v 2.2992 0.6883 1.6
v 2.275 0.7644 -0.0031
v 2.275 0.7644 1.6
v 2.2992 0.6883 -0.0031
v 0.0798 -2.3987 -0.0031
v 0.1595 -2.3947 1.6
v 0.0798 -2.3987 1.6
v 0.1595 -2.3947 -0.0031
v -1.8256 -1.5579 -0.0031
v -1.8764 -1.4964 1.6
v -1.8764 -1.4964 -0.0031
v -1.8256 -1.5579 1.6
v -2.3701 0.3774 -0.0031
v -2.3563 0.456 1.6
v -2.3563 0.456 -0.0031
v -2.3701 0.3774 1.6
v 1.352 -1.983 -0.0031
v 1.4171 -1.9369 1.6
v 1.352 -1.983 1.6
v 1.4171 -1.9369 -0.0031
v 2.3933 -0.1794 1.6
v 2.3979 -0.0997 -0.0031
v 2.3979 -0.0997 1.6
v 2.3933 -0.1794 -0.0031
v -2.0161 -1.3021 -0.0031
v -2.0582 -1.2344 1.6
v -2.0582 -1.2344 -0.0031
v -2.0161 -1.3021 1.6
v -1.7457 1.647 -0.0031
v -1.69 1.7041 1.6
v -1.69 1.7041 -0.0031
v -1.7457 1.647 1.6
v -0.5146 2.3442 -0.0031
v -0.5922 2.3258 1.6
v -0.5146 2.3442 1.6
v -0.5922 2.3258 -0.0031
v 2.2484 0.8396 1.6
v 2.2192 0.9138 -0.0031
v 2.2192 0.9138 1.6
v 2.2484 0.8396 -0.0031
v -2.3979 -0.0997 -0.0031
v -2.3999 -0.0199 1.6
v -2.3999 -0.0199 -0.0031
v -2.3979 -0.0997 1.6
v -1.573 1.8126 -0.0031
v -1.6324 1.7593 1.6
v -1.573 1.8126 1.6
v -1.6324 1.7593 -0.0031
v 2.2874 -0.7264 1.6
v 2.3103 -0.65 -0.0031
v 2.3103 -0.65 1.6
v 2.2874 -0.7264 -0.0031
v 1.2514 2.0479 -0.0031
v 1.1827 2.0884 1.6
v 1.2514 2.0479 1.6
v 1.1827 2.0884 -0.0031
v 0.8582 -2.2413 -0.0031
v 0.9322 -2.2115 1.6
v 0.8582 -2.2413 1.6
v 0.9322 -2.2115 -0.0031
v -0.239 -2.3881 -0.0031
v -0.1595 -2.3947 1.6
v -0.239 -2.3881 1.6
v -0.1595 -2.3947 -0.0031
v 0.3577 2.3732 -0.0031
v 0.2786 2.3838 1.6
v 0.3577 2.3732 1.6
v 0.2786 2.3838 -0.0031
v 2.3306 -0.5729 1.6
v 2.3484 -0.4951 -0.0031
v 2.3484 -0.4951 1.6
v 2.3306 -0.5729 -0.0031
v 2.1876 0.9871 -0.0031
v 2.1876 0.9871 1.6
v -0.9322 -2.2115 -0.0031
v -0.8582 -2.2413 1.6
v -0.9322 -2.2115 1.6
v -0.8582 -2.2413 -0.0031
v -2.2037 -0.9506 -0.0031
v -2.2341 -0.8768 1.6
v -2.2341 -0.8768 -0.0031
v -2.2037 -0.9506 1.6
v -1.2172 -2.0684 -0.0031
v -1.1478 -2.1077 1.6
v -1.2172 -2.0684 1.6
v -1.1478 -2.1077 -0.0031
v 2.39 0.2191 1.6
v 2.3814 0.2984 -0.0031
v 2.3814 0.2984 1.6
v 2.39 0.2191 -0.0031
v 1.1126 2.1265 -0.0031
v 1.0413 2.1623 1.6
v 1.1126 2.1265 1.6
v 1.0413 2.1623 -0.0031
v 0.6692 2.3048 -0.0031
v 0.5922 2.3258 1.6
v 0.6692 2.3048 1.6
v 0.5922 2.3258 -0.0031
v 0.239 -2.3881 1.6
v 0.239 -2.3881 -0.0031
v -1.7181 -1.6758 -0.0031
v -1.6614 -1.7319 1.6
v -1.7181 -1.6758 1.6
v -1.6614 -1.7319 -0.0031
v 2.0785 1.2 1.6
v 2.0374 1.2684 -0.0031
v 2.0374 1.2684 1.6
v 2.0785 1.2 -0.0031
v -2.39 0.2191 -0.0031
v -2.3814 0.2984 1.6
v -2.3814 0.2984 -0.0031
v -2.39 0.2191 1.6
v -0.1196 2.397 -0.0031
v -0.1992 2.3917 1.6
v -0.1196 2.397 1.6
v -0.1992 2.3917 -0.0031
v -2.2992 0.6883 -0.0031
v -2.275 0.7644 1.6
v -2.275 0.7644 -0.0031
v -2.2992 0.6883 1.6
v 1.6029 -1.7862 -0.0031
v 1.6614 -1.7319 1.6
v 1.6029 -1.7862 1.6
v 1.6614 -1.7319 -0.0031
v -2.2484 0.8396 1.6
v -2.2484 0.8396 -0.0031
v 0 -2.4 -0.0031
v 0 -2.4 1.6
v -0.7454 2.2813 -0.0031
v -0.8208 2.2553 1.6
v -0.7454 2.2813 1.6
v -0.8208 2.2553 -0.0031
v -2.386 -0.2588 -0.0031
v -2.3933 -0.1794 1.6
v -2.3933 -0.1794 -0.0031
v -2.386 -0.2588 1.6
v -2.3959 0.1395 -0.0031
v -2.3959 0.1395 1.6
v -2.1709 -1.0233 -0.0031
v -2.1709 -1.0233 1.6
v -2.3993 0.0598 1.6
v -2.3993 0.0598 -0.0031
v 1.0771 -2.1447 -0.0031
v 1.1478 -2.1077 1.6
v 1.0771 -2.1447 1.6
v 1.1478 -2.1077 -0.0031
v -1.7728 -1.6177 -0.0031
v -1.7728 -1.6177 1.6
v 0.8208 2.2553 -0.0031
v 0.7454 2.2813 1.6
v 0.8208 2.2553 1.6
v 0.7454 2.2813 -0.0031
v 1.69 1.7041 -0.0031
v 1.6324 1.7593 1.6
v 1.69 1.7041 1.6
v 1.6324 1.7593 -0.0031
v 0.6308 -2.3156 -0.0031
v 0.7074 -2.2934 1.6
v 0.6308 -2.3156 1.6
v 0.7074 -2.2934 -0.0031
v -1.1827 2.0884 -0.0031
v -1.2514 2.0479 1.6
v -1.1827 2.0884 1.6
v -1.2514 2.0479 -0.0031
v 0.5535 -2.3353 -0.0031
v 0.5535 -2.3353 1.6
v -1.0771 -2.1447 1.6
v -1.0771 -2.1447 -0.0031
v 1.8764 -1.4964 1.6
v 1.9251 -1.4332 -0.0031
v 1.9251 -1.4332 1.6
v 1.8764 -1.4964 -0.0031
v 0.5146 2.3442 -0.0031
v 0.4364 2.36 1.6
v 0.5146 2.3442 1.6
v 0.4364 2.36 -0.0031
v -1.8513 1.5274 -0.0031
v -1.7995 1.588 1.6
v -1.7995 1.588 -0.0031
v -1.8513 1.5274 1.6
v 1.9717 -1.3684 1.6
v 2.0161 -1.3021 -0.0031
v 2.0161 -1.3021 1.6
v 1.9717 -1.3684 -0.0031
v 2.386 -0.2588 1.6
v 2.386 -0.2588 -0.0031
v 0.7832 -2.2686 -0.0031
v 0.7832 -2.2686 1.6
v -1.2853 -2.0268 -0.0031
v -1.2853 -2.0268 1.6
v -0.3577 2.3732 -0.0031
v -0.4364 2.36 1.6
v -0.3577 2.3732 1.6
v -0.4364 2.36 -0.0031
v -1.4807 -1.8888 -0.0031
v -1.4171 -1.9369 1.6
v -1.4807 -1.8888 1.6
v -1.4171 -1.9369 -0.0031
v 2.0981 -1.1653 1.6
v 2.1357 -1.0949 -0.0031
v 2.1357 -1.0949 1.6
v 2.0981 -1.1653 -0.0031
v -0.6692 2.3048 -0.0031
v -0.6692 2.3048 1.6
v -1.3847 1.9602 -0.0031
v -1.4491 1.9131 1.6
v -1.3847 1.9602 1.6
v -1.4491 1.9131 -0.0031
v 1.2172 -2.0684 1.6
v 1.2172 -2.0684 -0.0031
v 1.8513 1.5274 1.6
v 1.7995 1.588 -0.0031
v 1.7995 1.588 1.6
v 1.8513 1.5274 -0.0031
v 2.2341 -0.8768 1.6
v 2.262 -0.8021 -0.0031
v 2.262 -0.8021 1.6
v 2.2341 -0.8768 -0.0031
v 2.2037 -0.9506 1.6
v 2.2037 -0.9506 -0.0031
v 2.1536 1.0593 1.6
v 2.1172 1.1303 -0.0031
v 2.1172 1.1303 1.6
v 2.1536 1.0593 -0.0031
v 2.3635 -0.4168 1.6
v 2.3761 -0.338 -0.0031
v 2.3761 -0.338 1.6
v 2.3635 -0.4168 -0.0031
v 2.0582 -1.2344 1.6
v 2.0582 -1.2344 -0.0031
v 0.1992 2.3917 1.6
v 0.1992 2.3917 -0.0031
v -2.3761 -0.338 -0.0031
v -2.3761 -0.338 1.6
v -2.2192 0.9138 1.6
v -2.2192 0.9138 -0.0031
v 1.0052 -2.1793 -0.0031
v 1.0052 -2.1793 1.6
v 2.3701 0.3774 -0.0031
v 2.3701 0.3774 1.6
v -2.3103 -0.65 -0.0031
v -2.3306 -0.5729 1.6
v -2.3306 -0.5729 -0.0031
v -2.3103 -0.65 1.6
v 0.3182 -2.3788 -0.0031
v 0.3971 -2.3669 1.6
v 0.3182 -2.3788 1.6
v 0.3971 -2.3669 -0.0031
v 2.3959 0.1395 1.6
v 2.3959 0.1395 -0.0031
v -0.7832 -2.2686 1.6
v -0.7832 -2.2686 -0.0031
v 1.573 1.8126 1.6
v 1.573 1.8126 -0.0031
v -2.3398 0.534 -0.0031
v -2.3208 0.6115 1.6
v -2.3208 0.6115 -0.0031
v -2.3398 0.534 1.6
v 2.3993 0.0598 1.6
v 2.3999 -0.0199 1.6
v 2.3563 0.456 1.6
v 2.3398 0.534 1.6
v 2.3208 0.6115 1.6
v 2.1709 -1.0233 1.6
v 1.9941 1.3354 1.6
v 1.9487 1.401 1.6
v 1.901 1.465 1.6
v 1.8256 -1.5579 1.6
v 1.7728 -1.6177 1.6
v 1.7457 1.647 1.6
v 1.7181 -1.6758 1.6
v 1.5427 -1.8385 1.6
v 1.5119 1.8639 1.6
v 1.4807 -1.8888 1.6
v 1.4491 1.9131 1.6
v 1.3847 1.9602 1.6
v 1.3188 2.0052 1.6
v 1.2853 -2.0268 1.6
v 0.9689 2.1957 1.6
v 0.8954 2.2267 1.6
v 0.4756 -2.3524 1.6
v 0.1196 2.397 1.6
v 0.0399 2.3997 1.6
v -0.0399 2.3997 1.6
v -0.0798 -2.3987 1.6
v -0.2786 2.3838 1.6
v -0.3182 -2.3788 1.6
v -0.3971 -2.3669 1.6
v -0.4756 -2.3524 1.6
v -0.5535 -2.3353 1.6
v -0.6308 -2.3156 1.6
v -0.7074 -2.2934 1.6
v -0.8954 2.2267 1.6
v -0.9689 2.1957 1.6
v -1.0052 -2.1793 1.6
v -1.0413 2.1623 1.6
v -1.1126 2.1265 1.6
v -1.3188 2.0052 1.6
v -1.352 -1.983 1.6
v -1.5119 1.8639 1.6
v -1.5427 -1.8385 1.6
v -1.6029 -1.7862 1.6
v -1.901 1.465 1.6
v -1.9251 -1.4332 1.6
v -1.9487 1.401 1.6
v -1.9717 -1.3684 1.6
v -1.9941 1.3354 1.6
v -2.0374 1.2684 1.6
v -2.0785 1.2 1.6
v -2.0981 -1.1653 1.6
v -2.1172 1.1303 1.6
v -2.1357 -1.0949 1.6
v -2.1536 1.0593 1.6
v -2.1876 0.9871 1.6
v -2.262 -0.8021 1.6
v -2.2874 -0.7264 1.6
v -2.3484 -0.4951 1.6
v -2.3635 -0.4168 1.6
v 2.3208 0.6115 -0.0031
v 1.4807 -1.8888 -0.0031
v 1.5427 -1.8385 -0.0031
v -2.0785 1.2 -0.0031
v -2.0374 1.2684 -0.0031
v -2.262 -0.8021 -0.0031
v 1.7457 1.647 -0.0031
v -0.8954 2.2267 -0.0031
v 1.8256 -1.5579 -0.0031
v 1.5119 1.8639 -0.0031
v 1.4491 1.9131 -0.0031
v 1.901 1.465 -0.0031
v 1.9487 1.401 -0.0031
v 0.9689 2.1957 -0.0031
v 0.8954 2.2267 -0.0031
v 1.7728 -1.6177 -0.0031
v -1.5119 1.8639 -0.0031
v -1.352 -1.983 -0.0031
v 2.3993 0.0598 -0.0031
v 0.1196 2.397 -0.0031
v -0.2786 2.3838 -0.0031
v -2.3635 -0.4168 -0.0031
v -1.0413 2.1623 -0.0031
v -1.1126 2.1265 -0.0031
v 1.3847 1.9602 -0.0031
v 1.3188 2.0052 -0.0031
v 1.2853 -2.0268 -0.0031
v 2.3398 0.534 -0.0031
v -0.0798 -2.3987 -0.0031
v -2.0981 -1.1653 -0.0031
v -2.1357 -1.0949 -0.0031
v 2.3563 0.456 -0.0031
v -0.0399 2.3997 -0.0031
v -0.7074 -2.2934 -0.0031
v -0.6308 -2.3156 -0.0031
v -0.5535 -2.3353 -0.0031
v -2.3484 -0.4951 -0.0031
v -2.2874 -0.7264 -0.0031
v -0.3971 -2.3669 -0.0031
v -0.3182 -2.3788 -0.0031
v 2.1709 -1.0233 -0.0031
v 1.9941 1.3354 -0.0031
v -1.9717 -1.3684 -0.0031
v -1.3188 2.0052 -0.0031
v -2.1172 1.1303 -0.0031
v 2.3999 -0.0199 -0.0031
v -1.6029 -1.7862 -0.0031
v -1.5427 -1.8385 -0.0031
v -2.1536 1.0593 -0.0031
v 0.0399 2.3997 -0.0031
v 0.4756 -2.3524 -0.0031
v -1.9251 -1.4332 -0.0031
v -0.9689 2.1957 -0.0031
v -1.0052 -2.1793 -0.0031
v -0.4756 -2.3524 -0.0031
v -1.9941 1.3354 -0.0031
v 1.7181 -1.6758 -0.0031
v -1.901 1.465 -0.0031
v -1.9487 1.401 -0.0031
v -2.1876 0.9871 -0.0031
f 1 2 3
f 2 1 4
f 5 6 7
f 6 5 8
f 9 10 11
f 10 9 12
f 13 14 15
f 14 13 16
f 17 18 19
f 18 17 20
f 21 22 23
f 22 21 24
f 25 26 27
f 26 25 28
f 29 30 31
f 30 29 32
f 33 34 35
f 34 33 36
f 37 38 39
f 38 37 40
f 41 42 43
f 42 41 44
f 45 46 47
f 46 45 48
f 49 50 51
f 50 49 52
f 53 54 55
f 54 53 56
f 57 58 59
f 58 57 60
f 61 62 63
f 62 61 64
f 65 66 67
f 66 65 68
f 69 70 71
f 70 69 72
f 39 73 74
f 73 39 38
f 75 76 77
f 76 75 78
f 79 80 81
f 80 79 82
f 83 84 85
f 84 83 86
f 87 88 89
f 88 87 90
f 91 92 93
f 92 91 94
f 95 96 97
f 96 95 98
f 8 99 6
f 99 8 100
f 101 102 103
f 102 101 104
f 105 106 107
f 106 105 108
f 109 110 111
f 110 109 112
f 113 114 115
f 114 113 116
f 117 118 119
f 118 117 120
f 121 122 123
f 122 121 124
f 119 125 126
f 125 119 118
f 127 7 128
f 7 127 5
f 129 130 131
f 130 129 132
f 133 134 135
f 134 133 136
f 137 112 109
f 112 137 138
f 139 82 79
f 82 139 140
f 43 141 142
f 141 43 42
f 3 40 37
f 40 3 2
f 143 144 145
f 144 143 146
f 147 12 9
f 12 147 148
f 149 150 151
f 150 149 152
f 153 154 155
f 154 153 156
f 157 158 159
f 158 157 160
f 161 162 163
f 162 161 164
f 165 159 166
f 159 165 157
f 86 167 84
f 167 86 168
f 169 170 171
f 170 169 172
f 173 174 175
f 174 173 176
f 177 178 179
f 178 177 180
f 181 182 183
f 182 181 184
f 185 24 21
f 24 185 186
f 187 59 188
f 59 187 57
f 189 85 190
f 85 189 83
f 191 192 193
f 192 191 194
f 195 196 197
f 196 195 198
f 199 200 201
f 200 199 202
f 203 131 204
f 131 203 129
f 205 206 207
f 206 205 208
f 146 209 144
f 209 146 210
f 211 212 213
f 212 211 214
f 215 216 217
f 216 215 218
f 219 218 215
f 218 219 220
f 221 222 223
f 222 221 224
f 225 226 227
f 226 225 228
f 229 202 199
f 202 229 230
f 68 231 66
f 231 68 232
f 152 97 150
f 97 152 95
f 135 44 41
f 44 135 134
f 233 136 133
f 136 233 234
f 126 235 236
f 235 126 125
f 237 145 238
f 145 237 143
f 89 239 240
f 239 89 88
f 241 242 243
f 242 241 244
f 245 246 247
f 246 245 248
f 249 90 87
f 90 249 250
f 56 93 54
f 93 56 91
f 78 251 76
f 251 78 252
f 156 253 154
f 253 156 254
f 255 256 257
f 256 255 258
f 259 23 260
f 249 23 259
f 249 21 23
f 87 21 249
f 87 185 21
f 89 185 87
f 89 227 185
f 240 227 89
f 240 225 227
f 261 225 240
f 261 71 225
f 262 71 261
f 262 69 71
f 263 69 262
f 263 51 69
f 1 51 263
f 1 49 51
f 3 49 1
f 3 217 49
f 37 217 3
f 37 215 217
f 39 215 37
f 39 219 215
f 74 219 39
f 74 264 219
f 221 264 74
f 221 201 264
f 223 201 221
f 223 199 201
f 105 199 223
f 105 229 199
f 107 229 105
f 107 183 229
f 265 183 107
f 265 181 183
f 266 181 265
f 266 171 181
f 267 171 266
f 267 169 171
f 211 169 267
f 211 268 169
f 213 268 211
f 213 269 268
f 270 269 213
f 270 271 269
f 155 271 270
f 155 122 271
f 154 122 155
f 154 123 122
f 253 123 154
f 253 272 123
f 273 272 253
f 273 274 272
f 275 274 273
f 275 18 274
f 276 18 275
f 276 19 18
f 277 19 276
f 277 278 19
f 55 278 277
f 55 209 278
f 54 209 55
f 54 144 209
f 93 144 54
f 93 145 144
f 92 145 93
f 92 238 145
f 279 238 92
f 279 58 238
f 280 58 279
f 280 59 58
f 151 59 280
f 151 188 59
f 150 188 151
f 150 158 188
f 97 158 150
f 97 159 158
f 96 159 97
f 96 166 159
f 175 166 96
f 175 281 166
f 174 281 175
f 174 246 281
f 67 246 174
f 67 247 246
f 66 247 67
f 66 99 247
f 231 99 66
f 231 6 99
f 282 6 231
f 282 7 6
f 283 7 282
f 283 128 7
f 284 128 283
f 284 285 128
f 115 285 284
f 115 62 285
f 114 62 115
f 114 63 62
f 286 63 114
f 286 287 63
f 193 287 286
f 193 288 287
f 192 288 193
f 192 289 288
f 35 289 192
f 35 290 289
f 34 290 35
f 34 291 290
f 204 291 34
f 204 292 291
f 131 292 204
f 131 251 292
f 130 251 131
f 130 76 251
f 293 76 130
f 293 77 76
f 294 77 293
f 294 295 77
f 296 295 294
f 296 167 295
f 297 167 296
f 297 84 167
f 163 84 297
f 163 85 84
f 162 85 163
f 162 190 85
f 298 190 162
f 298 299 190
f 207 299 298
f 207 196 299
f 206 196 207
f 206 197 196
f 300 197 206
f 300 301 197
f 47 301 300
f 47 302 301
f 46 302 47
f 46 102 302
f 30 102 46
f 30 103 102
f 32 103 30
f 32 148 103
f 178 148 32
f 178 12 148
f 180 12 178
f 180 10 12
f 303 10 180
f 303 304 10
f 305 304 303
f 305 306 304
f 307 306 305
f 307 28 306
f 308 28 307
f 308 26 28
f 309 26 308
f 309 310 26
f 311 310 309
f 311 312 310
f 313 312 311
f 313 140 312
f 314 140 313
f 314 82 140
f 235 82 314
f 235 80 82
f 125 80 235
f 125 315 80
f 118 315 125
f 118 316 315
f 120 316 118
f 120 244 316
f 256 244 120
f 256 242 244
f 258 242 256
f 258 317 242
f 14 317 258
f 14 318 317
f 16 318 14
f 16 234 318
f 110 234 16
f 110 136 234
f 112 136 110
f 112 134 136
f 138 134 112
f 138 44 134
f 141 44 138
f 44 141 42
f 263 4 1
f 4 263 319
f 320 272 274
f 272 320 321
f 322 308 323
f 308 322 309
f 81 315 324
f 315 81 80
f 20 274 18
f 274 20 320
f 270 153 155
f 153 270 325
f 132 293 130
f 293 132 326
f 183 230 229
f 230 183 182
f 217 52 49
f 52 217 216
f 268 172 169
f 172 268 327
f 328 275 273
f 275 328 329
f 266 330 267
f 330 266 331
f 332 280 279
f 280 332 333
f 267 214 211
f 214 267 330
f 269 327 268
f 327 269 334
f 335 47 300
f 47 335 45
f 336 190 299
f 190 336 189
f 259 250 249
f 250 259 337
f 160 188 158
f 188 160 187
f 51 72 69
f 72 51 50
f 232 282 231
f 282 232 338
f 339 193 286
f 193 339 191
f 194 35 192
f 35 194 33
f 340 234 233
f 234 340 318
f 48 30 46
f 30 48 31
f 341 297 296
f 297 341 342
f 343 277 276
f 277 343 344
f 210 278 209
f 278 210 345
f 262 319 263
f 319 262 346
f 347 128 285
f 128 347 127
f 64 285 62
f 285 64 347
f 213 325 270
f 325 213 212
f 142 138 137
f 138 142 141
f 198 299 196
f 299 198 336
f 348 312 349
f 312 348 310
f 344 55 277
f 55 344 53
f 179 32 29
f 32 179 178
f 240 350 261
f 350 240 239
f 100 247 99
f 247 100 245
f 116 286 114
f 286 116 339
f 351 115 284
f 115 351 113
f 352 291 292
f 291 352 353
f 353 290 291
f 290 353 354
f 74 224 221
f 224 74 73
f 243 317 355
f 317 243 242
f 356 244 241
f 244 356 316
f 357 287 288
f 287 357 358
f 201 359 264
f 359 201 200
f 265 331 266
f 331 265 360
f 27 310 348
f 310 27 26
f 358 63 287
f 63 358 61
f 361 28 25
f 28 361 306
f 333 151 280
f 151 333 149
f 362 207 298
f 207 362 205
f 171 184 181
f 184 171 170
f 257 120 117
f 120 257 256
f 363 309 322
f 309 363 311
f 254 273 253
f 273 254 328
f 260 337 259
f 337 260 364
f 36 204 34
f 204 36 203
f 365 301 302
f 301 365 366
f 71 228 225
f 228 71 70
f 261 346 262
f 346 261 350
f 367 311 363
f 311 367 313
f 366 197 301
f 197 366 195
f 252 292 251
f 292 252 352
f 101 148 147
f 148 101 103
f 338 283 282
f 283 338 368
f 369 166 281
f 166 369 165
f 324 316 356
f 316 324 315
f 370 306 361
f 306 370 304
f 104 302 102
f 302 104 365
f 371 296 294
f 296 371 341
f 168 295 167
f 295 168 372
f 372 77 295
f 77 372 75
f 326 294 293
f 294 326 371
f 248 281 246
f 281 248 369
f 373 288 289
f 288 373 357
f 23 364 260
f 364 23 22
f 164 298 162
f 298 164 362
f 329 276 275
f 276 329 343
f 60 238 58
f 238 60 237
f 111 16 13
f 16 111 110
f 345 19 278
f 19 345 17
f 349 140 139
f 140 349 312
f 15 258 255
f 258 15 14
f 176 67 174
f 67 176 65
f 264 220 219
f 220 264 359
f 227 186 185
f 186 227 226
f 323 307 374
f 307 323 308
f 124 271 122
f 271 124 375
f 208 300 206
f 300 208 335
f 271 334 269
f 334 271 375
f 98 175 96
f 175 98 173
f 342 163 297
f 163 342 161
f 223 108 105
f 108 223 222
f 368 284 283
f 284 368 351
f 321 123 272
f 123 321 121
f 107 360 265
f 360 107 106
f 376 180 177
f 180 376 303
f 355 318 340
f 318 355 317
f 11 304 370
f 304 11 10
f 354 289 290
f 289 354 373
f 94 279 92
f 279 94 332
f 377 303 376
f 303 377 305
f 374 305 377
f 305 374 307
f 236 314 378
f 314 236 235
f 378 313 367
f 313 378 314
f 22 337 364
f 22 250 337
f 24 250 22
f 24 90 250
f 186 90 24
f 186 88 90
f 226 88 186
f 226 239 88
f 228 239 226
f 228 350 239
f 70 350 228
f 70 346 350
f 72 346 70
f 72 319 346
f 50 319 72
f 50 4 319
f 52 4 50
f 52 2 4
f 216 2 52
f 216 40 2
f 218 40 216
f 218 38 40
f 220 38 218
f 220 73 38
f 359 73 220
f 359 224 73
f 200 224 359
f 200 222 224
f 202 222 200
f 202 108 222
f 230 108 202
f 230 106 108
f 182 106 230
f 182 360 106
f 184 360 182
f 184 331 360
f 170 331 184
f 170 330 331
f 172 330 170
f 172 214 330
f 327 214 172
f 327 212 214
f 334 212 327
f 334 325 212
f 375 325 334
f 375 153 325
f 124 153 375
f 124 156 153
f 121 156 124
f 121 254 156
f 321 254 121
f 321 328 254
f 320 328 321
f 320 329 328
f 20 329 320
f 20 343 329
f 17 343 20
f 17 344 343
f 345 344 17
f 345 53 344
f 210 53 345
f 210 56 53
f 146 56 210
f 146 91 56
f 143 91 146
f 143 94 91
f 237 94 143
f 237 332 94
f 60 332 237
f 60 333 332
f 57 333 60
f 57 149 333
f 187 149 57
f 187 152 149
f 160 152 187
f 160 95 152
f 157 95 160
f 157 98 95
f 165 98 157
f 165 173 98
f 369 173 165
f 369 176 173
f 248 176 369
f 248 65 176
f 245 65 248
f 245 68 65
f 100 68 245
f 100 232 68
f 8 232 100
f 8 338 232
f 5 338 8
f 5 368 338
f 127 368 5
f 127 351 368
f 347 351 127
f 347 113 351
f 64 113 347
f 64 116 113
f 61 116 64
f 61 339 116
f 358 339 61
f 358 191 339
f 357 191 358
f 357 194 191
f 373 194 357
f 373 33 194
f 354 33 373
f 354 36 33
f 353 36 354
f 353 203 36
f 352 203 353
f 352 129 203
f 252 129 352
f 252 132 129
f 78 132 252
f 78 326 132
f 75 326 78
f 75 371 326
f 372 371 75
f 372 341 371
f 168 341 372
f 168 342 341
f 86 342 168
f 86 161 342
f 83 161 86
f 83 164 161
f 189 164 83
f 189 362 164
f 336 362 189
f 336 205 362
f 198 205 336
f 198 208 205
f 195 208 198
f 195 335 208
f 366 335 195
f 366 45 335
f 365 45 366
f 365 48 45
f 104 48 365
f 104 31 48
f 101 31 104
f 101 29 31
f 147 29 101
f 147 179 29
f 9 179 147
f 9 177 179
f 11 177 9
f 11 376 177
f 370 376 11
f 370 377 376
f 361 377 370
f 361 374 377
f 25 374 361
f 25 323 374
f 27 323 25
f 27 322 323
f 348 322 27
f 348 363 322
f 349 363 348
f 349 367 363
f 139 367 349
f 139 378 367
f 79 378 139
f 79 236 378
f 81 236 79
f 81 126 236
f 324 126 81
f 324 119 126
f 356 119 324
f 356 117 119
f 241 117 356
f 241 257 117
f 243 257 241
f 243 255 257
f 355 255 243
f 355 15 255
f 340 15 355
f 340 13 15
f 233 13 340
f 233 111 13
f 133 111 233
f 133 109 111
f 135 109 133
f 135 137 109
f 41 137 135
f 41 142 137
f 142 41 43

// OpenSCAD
use <../lib.scad>
use <../p/1-4cyli.scad>
use <s/3195p02s01.scad>
use <s/3195p02s02.scad>
use <s/3195s01.scad>
use <../p/stud.scad>
$fa=1; $fs=0.2;
function ldraw_lib__3195p02(realsolid=false) = [
// 0 Door  1 x  5 x  4 Left with Blue Fish and "Transport" Pattern
// 0 Name: 3195p02.dat
// 0 Author: Jan Folkersma [Stinky]
// 0 !LDRAW_ORG Part UPDATE 2015-01
// 0 !LICENSE Licensed under CC BY 2.0 and CC BY 4.0 : see CAreadme.txt
// 
// 0 BFC CERTIFY CCW
  [0,"BFC","CERTIFY"],
  [0,"BFC","CCW"],
// 
// 0 !HISTORY 2007-01-10 [mikeheide] use subfile
// 0 !HISTORY 2009-09-03 [PTadmin] Official Update 2009-02
// 0 !HISTORY 2014-11-21 [roland] Auto-corrected with libfix version of LDCad 1.4
// 0 !HISTORY 2014-12-26 [Philo] Rebuilt and subparted pattern
// 0 !HISTORY 2015-10-11 [PTadmin] Official Update 2015-01
// 
// 
// 1 16 0 0 0 1 0 0 0 1 0 0 0 1 s\3195s01.dat
  [1,16,0,0,0,1,0,0,0,1,0,0,0,1, ldraw_lib__s__3195s01(realsolid)],
// 1 16 0 0 0 10 0 0 0 96 0 0 0 -10 1-4cyli.dat
  [1,16,0,0,0,10,0,0,0,96,0,0,0,-10, ldraw_lib__1_4cyli(realsolid)],
// 1 16 0 0 0 1 0 0 0 1 0 0 0 1 stud.dat
  [1,16,0,0,0,1,0,0,0,1,0,0,0,1, ldraw_lib__stud(realsolid)],
// 4 16 10 43 82 10 53 82 10 96 90 10 0 90
  [4,16,10,43,82,10,53,82,10,96,90,10,0,90],
// 4 16 10 43 78 10 43 82 10 0 90 10 28 67
  [4,16,10,43,78,10,43,82,10,0,90,10,28,67],
// 4 16 10 56 1 10 28 1 10 0 0 10 96.1 0
  [4,16,10,56,1,10,28,1,10,0,0,10,96.1,0],
// 3 16 10 56 1 10 96.1 0 10 73 1
  [3,16,10,56,1,10,96.1,0,10,73,1],
// 4 16 10 73 67 10 73 1 10 96.1 0 10 96 90
  [4,16,10,73,67,10,73,1,10,96.1,0,10,96,90],
// 4 16 10 73 67 10 96 90 10 53 82 10 53 78
  [4,16,10,73,67,10,96,90,10,53,82,10,53,78],
// 4 16 10 56 67 10 73 67 10 53 78 10 43 78
  [4,16,10,56,67,10,73,67,10,53,78,10,43,78],
// 3 16 10 28 67 10 56 67 10 43 78
  [3,16,10,28,67,10,56,67,10,43,78],
// 4 16 10 28 67 10 0 90 10 0 0 10 28 1
  [4,16,10,28,67,10,0,90,10,0,0,10,28,1],
// 1 16 10 0 0 1 0 0 0 1 0 0 0 1 s\3195p02s01.dat
  [1,16,10,0,0,1,0,0,0,1,0,0,0,1, ldraw_lib__s__3195p02s01(realsolid)],
// 1 16 10 0 0 1 0 0 0 1 0 0 0 1 s\3195p02s02.dat
  [1,16,10,0,0,1,0,0,0,1,0,0,0,1, ldraw_lib__s__3195p02s02(realsolid)],
];
module ldraw_lib__3195p02(step=0, col=false, unit=2/5, alt=false, line=0.2, solid=!$preview)
    makepoly(ldraw_lib__3195p02(solid), step=step, col=col, unit=unit, alt=alt, line=line, solid=solid);
ldraw_lib__3195p02(line=0.2);
